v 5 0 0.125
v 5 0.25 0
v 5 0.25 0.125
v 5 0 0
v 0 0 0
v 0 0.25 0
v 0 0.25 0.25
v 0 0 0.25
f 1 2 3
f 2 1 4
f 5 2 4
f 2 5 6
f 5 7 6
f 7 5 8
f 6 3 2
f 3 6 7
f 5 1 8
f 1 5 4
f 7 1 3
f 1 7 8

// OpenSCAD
trim_angle = atan2(1/8,5);

difference() {
cube([5,1/4,1/4]);
translate([0,-1/8,1/4]) 
  rotate([0,trim_angle,0])
     # cube([5.5,1/2,1/2]);
}
